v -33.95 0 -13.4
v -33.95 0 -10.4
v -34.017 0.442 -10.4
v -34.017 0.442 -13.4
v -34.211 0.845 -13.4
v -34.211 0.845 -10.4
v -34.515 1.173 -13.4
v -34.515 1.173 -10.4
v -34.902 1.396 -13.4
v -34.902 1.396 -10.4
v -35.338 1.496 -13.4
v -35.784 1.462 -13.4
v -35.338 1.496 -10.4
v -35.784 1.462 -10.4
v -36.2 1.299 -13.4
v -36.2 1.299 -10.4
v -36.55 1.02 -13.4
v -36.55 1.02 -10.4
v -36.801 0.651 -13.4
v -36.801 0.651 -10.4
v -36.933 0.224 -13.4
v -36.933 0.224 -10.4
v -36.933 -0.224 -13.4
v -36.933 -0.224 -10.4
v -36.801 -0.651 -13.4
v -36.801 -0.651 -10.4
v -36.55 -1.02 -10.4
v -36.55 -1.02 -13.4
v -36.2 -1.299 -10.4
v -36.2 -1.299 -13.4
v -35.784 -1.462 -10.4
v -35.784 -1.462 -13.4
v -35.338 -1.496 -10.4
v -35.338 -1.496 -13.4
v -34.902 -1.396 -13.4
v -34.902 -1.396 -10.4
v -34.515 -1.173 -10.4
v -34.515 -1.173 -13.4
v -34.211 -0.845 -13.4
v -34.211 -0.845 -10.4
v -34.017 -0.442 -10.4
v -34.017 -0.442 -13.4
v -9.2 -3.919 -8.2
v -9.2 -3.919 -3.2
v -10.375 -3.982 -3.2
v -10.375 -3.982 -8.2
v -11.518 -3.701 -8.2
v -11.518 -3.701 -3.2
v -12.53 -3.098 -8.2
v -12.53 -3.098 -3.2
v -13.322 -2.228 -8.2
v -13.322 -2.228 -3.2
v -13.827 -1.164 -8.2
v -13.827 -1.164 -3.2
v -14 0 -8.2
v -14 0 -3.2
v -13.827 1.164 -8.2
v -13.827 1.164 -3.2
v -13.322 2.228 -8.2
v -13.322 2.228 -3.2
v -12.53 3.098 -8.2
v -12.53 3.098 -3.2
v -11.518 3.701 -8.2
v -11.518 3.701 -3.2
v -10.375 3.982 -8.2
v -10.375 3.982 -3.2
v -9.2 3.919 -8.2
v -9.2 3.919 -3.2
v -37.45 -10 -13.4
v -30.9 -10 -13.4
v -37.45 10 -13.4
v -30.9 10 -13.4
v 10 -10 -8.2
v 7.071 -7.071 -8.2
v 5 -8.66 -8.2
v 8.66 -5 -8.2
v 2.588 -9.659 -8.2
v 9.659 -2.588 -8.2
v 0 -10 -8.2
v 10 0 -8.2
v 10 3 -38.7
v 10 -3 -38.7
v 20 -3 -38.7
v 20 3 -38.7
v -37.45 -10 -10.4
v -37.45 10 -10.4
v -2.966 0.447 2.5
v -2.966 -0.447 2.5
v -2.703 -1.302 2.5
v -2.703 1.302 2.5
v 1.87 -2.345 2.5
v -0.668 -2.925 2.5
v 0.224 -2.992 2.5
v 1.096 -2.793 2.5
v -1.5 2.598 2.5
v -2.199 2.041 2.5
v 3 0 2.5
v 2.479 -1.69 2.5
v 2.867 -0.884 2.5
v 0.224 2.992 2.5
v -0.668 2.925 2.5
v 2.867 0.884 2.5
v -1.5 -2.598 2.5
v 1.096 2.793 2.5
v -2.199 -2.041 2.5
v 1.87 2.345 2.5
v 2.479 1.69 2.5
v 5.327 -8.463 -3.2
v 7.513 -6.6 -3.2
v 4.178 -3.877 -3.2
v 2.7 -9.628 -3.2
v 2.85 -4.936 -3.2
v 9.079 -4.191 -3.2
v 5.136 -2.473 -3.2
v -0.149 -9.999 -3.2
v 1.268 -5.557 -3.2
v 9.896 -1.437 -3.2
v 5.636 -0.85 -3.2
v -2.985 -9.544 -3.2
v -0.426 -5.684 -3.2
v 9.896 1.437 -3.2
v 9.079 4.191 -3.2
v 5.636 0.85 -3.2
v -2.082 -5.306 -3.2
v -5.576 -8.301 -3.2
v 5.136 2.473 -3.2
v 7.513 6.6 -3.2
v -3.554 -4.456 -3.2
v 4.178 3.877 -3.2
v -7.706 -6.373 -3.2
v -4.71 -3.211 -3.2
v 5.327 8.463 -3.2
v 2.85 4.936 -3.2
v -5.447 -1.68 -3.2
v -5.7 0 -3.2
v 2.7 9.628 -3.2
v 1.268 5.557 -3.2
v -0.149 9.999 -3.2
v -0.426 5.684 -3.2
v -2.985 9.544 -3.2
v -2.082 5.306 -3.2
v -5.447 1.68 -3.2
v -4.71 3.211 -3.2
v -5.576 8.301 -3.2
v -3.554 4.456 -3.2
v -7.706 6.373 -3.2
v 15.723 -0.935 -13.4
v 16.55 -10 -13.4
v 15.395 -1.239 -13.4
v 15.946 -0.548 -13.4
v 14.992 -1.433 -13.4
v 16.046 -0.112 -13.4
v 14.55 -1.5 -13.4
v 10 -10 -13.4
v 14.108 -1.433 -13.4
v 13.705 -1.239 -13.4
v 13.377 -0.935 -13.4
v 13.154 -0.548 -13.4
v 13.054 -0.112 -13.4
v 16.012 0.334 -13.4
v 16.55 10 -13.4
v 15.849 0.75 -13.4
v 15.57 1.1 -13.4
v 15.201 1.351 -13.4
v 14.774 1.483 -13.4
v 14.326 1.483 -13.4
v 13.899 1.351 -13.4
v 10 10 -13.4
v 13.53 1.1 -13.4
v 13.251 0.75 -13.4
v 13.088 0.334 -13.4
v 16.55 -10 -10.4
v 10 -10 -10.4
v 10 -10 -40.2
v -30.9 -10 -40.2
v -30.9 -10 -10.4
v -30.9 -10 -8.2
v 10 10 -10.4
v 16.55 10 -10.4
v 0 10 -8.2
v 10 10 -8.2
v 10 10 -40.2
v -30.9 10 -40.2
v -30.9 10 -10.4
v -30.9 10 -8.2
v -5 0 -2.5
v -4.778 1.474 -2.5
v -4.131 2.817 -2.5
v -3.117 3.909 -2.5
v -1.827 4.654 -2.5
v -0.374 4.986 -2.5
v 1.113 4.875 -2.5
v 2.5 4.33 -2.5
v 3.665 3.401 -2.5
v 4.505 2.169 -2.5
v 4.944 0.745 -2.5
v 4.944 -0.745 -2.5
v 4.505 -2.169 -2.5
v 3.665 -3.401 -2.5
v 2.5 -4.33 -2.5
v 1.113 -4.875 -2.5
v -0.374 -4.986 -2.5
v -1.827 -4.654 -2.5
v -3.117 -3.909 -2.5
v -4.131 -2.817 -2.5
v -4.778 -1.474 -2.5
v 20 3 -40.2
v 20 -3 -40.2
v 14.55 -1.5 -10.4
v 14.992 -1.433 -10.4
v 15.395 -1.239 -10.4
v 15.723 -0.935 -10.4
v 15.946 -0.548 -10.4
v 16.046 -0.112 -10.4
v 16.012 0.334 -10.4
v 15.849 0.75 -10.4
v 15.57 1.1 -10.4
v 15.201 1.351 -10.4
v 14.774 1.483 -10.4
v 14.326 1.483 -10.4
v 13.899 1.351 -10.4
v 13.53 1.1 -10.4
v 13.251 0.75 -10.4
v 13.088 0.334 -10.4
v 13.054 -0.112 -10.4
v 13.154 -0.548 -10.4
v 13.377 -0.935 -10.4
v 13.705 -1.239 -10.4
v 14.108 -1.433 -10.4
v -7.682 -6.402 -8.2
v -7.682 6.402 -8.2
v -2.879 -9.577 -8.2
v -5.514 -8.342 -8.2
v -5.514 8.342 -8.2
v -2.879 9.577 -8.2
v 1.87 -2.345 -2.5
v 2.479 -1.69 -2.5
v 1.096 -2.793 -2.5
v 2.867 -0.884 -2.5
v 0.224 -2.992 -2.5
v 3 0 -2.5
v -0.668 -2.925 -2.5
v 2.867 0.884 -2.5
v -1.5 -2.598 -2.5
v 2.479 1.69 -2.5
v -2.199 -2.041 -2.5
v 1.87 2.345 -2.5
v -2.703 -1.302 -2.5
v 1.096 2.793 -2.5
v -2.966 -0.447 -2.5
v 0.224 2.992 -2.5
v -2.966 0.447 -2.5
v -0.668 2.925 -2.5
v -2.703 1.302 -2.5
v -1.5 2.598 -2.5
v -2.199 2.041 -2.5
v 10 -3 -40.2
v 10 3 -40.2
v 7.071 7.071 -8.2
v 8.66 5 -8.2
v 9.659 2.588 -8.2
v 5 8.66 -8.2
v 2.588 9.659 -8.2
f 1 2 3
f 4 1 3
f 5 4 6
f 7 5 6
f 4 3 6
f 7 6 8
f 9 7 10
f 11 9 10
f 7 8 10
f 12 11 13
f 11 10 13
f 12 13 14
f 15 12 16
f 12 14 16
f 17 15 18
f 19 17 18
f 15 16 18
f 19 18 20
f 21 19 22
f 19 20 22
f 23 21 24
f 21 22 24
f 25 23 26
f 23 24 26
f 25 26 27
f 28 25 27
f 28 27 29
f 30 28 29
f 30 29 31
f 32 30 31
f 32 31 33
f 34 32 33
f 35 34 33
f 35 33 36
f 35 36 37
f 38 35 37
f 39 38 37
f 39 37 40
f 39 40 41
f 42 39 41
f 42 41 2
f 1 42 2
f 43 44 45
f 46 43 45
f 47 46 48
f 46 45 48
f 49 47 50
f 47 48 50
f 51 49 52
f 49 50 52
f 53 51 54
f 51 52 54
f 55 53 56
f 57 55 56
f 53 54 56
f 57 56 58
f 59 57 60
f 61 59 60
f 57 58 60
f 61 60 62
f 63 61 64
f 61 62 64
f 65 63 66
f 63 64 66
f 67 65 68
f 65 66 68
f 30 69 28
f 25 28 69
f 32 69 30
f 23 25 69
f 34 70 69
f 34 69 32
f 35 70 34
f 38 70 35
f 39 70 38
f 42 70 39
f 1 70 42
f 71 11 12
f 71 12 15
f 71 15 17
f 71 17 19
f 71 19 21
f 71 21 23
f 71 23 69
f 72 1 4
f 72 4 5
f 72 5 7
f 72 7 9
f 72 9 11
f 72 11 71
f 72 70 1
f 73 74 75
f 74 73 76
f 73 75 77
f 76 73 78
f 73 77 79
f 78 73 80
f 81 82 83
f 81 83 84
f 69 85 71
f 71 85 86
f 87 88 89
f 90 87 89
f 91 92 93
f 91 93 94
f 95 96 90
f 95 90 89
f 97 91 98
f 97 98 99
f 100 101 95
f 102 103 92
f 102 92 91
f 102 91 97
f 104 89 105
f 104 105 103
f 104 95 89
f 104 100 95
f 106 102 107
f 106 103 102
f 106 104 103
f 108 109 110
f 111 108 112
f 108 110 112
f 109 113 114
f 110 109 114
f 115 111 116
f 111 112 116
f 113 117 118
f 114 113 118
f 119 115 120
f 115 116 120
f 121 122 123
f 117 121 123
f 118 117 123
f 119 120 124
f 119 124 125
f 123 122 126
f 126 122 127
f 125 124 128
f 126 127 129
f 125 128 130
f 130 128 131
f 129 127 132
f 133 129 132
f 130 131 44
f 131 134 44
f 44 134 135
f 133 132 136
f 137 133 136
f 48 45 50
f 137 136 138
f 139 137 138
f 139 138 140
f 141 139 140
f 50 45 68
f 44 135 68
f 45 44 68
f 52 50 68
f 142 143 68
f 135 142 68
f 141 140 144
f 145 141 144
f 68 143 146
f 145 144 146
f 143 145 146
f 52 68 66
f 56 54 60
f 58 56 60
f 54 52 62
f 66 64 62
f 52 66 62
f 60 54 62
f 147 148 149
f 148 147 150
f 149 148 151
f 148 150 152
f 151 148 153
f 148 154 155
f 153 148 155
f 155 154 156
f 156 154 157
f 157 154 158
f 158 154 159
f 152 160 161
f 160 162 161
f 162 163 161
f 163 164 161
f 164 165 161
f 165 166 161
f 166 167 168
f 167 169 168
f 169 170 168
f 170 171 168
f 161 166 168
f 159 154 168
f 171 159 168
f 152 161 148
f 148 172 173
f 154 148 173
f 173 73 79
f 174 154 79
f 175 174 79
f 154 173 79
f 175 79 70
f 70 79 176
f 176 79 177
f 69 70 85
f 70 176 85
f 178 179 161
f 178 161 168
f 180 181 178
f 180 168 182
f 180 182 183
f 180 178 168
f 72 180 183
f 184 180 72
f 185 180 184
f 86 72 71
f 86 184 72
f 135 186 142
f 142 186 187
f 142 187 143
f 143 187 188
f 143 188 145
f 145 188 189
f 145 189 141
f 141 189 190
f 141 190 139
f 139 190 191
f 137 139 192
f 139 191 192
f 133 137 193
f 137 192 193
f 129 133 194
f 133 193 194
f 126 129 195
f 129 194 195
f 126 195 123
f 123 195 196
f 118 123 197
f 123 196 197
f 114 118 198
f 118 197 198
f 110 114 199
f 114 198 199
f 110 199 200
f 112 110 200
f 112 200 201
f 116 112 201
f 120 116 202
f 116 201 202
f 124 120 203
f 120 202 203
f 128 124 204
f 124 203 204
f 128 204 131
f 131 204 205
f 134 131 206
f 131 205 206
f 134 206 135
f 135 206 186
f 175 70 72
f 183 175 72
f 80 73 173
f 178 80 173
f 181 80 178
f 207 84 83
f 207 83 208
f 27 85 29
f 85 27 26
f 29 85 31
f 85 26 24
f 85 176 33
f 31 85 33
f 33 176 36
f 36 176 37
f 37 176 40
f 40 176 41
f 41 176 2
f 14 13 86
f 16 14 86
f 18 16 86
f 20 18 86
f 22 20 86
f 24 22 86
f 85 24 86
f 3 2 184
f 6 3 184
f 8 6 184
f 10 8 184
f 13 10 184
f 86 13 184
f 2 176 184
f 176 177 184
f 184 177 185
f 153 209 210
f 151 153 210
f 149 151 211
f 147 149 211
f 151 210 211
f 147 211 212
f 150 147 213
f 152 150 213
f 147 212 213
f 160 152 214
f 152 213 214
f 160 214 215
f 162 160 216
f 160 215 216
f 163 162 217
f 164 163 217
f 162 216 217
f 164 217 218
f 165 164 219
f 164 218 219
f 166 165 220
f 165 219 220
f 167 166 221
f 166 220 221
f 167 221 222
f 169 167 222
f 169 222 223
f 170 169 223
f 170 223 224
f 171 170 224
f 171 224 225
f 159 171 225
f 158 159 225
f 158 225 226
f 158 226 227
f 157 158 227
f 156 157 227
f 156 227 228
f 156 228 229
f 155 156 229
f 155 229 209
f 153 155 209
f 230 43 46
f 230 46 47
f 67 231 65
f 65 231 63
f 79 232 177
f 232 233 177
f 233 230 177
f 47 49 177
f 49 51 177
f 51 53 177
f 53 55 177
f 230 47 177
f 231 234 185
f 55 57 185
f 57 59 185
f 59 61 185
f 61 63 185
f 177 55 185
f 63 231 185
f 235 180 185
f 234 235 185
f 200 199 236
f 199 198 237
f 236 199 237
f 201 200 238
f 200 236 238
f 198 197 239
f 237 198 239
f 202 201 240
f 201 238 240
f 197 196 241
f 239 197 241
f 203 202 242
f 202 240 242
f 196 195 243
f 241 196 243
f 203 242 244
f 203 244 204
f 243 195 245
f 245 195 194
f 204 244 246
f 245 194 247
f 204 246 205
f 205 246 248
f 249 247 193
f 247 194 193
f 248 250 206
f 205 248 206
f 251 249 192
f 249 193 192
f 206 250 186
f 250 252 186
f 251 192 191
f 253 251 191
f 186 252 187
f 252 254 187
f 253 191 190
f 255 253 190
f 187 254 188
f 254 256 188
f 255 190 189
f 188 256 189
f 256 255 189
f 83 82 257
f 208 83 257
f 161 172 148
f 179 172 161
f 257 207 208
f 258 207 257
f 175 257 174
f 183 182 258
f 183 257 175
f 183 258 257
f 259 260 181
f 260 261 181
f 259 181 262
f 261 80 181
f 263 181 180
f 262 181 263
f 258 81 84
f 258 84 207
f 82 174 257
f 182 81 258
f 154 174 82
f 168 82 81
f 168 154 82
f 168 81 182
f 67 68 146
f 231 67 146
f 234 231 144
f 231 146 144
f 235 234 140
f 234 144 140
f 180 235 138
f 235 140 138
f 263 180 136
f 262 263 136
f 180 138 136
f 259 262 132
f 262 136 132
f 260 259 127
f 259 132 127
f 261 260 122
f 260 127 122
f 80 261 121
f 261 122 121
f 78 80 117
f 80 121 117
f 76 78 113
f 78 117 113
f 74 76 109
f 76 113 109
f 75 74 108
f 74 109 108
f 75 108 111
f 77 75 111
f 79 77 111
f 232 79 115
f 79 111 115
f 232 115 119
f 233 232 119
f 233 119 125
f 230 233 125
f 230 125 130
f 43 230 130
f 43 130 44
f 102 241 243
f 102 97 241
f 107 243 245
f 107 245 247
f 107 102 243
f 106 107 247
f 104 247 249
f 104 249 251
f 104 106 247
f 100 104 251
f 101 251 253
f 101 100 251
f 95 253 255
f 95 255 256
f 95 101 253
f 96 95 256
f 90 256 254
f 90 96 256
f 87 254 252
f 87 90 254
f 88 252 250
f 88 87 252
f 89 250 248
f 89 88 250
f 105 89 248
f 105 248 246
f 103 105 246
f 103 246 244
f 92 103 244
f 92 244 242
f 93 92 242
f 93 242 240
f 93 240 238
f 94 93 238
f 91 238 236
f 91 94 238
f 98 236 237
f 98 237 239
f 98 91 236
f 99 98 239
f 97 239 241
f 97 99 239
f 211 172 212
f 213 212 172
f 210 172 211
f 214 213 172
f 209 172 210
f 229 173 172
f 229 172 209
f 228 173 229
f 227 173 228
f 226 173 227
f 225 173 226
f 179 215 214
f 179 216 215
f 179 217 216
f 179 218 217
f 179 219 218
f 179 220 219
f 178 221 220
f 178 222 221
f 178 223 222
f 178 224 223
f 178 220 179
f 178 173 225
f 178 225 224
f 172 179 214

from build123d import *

# Parameters (mm, degrees)
SKETCH3_R           = 3
BOSS_EXTRUDE1_DEPTH = 2.5
SKETCH4_R           = 6
BOSS_EXTRUDE2_DEPTH = 0.7
BOSS_EXTRUDE3_DEPTH = 5
SKETCH6_W           = 40.9
SKETCH6_H           = 20
BOSS_EXTRUDE4_DEPTH = 32
SKETCH7_W           = 3
SKETCH7_H           = 20
BOSS_EXTRUDE5_DEPTH = 20
SKETCH8_OUTSIDE_W   = 101.628
SKETCH8_OUTSIDE_H   = 40.728
SKETCH8_OUTSIDE_W_2 = 54
SKETCH8_OUTSIDE_H_2 = 30
CUT_EXTRUDE1_DEPTH  = 66.626595219
CUT_EXTRUDE2_REACH  = 50.893
SKETCH10_R          = 1.5
SKETCH11_W          = 1.5
SKETCH11_H          = 6
BOSS_EXTRUDE6_DEPTH = 10
CHAMFER1_SIZE       = 1


with BuildPart() as part:
    # Sketch3 → Boss-Extrude1 (new, symmetric)
    with BuildSketch(Plane.XY):
        Circle(SKETCH3_R)
    extrude(amount=BOSS_EXTRUDE1_DEPTH, both=True)

    # Sketch4 → Boss-Extrude2 (add)
    with BuildSketch(Plane(origin=(0, 0, -2.5), x_dir=(-1, 0, 0), z_dir=(0, 0, -1))):
        Circle(SKETCH4_R)
    extrude(amount=BOSS_EXTRUDE2_DEPTH)

    # Sketch5 → Boss-Extrude3 (add)
    with BuildSketch(Plane(origin=(0, 0, -3.2), x_dir=(-1, 0, 0), z_dir=(0, 0, -1))):
        with BuildLine():
            ThreePointArc((9.2, 3.919183588), (-10, 0), (9.2, -3.919183588))
            ThreePointArc((9.2, -3.919183588), (14, 0), (9.2, 3.919183588))
        make_face()
    extrude(amount=BOSS_EXTRUDE3_DEPTH)

    # Sketch6 → Boss-Extrude4 (add)
    with BuildSketch(Plane(origin=(0, 0, -8.2), x_dir=(-1, 0, 0), z_dir=(0, 0, -1))):
        with Locations((10.45, 0)):
            Rectangle(SKETCH6_W, SKETCH6_H)
    extrude(amount=BOSS_EXTRUDE4_DEPTH)

    # Sketch7 → Boss-Extrude5 (add)
    with BuildSketch(Plane(origin=(10, 0, 0), x_dir=(0, 0, -1), z_dir=(1, 0, 0))):
        with Locations((11.9, 0)):
            Rectangle(SKETCH7_W, SKETCH7_H)
    boss_extrude5 = extrude(amount=BOSS_EXTRUDE5_DEPTH)

    # Mirror1: Boss-Extrude5 across plane
    add(boss_extrude5.mirror(Plane(origin=(-10.45, 0, 0), x_dir=(0, 0, 1), z_dir=(1, 0, 0))))

    # Sketch8 outside → Cut-Extrude1 (cut, through all)
    with BuildSketch(Plane.XY):
        with Locations((-10.45, 0)):
            Rectangle(SKETCH8_OUTSIDE_W, SKETCH8_OUTSIDE_H)
        with Locations((-10.45, 0)):
            Rectangle(SKETCH8_OUTSIDE_W_2, SKETCH8_OUTSIDE_H_2, mode=Mode.SUBTRACT)
    extrude(amount=-CUT_EXTRUDE1_DEPTH, mode=Mode.SUBTRACT)

    # Sketch10 → Cut-Extrude2 (cut, up to next)
    with BuildSketch(Plane.XY.offset(-10.4), mode=Mode.PRIVATE) as cut_extrude2_sk1:
        with Locations((-35.45, 0)):
            Circle(SKETCH10_R)
    cut_extrude2_tool1 = extrude(cut_extrude2_sk1.sketch, amount=-CUT_EXTRUDE2_REACH, mode=Mode.PRIVATE) & part.part
    # Sketch10 → Cut-Extrude2 (cut, up to next)
    with BuildSketch(Plane.XY.offset(-10.4), mode=Mode.PRIVATE) as cut_extrude2_sk2:
        with Locations(Location((14.55, 0, 0), (0, 0, 270))):
            Circle(SKETCH10_R)
    cut_extrude2_tool2 = extrude(cut_extrude2_sk2.sketch, amount=-CUT_EXTRUDE2_REACH, mode=Mode.PRIVATE) & part.part
    add(cut_extrude2_tool1.solids().sort_by_distance((-35.45, 0, -10.4))[0], mode=Mode.SUBTRACT)
    add(cut_extrude2_tool2.solids().sort_by_distance((14.55, 0, -10.4))[0], mode=Mode.SUBTRACT)

    # Sketch11 → Boss-Extrude6 (add)
    with BuildSketch(Plane(origin=(10, 0, 0), x_dir=(0, 0, -1), z_dir=(1, 0, 0))):
        with Locations((39.45, 0)):
            Rectangle(SKETCH11_W, SKETCH11_H)
    extrude(amount=BOSS_EXTRUDE6_DEPTH)

    # Chamfer1
    # the kernel refuses this chamfer: 1 mm, written as the material it takes off along each edge
    with BuildSketch(Plane(origin=(0, 0, -2.5), x_dir=(-1, 0, 0), z_dir=(0, -1, 0))) as chamfer1_piece_1_section:
        Polygon((6, CHAMFER1_SIZE), (6 - CHAMFER1_SIZE, 0), (6, 0), align=None)
    chamfer1_piece_1 = revolve(axis=Axis((0, 0, -2.5), (0, 0, -1)), mode=Mode.PRIVATE)
    chamfer1_piece_1 = split(chamfer1_piece_1, bisect_by=Plane(origin=(5.354214233, 0, -3.2), z_dir=(0, 0, 1)), keep=Keep.TOP, mode=Mode.PRIVATE)
    add(chamfer1_piece_1, mode=Mode.SUBTRACT)


solid = part.part
